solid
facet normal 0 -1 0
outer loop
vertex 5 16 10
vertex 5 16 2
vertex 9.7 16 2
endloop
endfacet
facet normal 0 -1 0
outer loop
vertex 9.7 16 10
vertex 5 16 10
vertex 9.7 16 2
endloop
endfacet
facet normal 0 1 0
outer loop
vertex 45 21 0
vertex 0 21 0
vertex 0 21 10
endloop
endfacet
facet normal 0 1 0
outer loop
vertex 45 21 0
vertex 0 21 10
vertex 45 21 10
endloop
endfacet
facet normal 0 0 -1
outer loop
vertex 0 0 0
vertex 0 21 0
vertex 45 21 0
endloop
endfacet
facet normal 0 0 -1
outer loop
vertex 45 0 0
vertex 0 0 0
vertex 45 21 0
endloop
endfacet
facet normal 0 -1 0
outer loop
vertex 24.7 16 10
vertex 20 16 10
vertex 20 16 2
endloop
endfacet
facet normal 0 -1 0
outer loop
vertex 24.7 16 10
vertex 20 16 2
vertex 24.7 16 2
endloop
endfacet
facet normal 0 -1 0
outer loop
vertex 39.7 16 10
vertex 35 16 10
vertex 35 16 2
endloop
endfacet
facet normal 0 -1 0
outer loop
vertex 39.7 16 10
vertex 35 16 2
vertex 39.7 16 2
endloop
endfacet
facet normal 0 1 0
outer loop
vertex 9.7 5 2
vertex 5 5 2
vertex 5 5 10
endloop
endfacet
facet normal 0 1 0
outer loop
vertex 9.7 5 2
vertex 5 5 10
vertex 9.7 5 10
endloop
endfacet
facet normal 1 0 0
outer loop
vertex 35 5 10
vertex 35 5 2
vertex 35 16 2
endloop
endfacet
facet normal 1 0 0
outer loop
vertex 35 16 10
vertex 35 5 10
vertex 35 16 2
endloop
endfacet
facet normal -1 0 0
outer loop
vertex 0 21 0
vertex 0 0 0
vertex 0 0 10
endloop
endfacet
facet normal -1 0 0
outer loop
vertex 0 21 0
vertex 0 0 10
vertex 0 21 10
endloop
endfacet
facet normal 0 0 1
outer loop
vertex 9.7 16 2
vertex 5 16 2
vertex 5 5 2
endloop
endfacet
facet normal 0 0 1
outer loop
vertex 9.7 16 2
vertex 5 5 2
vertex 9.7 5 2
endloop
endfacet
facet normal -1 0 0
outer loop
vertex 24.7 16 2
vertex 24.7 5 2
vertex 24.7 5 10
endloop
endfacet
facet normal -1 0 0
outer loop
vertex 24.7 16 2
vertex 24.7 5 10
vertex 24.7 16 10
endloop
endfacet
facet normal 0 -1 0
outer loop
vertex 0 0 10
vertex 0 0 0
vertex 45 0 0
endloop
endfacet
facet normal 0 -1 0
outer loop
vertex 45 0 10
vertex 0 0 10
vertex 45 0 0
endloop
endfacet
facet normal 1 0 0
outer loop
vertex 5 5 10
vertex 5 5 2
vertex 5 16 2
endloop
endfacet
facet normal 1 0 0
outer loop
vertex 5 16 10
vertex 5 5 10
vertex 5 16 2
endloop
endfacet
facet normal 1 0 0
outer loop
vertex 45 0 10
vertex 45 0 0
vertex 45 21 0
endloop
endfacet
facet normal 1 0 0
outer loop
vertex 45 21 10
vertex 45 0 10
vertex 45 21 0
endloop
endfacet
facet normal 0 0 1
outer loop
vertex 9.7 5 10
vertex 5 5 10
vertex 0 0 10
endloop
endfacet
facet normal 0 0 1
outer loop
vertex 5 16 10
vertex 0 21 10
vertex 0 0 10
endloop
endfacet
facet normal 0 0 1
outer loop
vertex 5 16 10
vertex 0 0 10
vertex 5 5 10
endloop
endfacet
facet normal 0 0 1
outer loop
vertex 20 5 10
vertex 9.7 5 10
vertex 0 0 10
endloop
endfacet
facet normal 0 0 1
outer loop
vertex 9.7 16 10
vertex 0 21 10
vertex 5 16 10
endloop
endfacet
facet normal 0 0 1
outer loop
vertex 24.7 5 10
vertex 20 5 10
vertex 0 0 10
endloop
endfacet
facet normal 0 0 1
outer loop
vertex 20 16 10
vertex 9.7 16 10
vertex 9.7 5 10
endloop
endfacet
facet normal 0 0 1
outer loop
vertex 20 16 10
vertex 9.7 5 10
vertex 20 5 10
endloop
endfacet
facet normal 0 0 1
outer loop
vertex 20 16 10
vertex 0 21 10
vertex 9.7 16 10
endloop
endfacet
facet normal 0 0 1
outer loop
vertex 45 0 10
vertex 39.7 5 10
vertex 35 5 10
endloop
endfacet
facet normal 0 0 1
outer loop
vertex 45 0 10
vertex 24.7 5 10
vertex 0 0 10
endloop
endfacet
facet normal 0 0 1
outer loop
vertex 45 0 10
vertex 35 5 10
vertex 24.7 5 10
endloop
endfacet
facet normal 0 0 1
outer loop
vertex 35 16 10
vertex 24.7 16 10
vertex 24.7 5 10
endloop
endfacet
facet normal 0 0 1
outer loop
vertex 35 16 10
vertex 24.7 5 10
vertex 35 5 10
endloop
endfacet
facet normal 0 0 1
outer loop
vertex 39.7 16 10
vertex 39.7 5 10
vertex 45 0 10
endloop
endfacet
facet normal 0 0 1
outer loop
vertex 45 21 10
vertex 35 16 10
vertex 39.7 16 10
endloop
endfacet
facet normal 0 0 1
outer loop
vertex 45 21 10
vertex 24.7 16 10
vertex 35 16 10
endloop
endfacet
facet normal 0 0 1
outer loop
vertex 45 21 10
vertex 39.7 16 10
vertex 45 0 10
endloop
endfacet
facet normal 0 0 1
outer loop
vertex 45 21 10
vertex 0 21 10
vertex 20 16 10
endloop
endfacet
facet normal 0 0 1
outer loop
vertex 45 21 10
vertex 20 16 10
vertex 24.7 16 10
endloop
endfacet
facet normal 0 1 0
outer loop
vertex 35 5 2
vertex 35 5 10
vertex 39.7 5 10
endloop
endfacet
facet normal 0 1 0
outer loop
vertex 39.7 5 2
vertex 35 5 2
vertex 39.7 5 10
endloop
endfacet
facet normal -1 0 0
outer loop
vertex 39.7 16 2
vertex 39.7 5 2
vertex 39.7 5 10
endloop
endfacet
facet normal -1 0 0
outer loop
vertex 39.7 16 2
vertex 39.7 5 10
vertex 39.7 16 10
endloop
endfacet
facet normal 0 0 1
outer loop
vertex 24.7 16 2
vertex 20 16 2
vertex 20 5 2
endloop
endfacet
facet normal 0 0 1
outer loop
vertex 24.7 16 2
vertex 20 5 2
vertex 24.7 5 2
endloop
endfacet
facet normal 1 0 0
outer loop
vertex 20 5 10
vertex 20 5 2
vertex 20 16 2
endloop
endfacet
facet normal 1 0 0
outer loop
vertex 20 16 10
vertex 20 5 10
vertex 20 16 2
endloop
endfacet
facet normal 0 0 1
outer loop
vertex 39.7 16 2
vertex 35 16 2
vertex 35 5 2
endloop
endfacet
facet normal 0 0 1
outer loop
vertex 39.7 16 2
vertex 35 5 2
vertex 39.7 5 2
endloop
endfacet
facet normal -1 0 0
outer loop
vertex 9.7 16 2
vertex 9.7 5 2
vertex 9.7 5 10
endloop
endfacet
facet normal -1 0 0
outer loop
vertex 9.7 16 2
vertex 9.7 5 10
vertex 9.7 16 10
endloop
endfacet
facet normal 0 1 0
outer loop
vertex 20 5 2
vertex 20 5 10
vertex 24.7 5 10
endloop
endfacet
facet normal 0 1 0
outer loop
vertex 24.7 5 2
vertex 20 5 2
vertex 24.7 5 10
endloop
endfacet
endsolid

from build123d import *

# Parameters (mm, degrees)
BOX001_W     = 4.7
BOX001_H     = 11
BOX001_DEPTH = 12
BOX002_W     = 4.7
BOX002_H     = 11
BOX002_DEPTH = 12
BOX_W        = 4.7
BOX_H        = 11
BOX_DEPTH    = 12
BOX003_W     = 45
BOX003_H     = 21
BOX003_DEPTH = 10


with BuildPart() as ranura2:
    # Box001 → Box001 (new body)
    with BuildSketch(Plane(origin=(15, 0, 0), x_dir=(1, 0, 0), z_dir=(0, 0, 1))):
        with Locations((2.35, 5.5)):
            Rectangle(BOX001_W, BOX001_H)
    extrude(amount=BOX001_DEPTH)


with BuildPart() as ranura3:
    # Box002 → Box002 (new body)
    with BuildSketch(Plane(origin=(30, 0, 0), x_dir=(1, 0, 0), z_dir=(0, 0, 1))):
        with Locations((2.35, 5.5)):
            Rectangle(BOX002_W, BOX002_H)
    extrude(amount=BOX002_DEPTH)


with BuildPart() as ranuras:
    # Box → Box (new body)
    with BuildSketch(Plane.XY):
        with Locations((2.35, 5.5)):
            Rectangle(BOX_W, BOX_H)
    extrude(amount=BOX_DEPTH)

    # Fusion: union ranura2, ranura3
    add(ranura2.part)
    add(ranura3.part)


with BuildPart() as ranuras_1:
    # Fusion placement: moved
    add(ranuras.part.moved(Location((5, 5, 2))))


with BuildPart() as cut:
    # Box003 → Box003 (new body)
    with BuildSketch(Plane.XY):
        with Locations((22.5, 10.5)):
            Rectangle(BOX003_W, BOX003_H)
    extrude(amount=BOX003_DEPTH)

    # Cut: cut ranuras
    add(ranuras_1.part, mode=Mode.SUBTRACT)


solid = cut.part
